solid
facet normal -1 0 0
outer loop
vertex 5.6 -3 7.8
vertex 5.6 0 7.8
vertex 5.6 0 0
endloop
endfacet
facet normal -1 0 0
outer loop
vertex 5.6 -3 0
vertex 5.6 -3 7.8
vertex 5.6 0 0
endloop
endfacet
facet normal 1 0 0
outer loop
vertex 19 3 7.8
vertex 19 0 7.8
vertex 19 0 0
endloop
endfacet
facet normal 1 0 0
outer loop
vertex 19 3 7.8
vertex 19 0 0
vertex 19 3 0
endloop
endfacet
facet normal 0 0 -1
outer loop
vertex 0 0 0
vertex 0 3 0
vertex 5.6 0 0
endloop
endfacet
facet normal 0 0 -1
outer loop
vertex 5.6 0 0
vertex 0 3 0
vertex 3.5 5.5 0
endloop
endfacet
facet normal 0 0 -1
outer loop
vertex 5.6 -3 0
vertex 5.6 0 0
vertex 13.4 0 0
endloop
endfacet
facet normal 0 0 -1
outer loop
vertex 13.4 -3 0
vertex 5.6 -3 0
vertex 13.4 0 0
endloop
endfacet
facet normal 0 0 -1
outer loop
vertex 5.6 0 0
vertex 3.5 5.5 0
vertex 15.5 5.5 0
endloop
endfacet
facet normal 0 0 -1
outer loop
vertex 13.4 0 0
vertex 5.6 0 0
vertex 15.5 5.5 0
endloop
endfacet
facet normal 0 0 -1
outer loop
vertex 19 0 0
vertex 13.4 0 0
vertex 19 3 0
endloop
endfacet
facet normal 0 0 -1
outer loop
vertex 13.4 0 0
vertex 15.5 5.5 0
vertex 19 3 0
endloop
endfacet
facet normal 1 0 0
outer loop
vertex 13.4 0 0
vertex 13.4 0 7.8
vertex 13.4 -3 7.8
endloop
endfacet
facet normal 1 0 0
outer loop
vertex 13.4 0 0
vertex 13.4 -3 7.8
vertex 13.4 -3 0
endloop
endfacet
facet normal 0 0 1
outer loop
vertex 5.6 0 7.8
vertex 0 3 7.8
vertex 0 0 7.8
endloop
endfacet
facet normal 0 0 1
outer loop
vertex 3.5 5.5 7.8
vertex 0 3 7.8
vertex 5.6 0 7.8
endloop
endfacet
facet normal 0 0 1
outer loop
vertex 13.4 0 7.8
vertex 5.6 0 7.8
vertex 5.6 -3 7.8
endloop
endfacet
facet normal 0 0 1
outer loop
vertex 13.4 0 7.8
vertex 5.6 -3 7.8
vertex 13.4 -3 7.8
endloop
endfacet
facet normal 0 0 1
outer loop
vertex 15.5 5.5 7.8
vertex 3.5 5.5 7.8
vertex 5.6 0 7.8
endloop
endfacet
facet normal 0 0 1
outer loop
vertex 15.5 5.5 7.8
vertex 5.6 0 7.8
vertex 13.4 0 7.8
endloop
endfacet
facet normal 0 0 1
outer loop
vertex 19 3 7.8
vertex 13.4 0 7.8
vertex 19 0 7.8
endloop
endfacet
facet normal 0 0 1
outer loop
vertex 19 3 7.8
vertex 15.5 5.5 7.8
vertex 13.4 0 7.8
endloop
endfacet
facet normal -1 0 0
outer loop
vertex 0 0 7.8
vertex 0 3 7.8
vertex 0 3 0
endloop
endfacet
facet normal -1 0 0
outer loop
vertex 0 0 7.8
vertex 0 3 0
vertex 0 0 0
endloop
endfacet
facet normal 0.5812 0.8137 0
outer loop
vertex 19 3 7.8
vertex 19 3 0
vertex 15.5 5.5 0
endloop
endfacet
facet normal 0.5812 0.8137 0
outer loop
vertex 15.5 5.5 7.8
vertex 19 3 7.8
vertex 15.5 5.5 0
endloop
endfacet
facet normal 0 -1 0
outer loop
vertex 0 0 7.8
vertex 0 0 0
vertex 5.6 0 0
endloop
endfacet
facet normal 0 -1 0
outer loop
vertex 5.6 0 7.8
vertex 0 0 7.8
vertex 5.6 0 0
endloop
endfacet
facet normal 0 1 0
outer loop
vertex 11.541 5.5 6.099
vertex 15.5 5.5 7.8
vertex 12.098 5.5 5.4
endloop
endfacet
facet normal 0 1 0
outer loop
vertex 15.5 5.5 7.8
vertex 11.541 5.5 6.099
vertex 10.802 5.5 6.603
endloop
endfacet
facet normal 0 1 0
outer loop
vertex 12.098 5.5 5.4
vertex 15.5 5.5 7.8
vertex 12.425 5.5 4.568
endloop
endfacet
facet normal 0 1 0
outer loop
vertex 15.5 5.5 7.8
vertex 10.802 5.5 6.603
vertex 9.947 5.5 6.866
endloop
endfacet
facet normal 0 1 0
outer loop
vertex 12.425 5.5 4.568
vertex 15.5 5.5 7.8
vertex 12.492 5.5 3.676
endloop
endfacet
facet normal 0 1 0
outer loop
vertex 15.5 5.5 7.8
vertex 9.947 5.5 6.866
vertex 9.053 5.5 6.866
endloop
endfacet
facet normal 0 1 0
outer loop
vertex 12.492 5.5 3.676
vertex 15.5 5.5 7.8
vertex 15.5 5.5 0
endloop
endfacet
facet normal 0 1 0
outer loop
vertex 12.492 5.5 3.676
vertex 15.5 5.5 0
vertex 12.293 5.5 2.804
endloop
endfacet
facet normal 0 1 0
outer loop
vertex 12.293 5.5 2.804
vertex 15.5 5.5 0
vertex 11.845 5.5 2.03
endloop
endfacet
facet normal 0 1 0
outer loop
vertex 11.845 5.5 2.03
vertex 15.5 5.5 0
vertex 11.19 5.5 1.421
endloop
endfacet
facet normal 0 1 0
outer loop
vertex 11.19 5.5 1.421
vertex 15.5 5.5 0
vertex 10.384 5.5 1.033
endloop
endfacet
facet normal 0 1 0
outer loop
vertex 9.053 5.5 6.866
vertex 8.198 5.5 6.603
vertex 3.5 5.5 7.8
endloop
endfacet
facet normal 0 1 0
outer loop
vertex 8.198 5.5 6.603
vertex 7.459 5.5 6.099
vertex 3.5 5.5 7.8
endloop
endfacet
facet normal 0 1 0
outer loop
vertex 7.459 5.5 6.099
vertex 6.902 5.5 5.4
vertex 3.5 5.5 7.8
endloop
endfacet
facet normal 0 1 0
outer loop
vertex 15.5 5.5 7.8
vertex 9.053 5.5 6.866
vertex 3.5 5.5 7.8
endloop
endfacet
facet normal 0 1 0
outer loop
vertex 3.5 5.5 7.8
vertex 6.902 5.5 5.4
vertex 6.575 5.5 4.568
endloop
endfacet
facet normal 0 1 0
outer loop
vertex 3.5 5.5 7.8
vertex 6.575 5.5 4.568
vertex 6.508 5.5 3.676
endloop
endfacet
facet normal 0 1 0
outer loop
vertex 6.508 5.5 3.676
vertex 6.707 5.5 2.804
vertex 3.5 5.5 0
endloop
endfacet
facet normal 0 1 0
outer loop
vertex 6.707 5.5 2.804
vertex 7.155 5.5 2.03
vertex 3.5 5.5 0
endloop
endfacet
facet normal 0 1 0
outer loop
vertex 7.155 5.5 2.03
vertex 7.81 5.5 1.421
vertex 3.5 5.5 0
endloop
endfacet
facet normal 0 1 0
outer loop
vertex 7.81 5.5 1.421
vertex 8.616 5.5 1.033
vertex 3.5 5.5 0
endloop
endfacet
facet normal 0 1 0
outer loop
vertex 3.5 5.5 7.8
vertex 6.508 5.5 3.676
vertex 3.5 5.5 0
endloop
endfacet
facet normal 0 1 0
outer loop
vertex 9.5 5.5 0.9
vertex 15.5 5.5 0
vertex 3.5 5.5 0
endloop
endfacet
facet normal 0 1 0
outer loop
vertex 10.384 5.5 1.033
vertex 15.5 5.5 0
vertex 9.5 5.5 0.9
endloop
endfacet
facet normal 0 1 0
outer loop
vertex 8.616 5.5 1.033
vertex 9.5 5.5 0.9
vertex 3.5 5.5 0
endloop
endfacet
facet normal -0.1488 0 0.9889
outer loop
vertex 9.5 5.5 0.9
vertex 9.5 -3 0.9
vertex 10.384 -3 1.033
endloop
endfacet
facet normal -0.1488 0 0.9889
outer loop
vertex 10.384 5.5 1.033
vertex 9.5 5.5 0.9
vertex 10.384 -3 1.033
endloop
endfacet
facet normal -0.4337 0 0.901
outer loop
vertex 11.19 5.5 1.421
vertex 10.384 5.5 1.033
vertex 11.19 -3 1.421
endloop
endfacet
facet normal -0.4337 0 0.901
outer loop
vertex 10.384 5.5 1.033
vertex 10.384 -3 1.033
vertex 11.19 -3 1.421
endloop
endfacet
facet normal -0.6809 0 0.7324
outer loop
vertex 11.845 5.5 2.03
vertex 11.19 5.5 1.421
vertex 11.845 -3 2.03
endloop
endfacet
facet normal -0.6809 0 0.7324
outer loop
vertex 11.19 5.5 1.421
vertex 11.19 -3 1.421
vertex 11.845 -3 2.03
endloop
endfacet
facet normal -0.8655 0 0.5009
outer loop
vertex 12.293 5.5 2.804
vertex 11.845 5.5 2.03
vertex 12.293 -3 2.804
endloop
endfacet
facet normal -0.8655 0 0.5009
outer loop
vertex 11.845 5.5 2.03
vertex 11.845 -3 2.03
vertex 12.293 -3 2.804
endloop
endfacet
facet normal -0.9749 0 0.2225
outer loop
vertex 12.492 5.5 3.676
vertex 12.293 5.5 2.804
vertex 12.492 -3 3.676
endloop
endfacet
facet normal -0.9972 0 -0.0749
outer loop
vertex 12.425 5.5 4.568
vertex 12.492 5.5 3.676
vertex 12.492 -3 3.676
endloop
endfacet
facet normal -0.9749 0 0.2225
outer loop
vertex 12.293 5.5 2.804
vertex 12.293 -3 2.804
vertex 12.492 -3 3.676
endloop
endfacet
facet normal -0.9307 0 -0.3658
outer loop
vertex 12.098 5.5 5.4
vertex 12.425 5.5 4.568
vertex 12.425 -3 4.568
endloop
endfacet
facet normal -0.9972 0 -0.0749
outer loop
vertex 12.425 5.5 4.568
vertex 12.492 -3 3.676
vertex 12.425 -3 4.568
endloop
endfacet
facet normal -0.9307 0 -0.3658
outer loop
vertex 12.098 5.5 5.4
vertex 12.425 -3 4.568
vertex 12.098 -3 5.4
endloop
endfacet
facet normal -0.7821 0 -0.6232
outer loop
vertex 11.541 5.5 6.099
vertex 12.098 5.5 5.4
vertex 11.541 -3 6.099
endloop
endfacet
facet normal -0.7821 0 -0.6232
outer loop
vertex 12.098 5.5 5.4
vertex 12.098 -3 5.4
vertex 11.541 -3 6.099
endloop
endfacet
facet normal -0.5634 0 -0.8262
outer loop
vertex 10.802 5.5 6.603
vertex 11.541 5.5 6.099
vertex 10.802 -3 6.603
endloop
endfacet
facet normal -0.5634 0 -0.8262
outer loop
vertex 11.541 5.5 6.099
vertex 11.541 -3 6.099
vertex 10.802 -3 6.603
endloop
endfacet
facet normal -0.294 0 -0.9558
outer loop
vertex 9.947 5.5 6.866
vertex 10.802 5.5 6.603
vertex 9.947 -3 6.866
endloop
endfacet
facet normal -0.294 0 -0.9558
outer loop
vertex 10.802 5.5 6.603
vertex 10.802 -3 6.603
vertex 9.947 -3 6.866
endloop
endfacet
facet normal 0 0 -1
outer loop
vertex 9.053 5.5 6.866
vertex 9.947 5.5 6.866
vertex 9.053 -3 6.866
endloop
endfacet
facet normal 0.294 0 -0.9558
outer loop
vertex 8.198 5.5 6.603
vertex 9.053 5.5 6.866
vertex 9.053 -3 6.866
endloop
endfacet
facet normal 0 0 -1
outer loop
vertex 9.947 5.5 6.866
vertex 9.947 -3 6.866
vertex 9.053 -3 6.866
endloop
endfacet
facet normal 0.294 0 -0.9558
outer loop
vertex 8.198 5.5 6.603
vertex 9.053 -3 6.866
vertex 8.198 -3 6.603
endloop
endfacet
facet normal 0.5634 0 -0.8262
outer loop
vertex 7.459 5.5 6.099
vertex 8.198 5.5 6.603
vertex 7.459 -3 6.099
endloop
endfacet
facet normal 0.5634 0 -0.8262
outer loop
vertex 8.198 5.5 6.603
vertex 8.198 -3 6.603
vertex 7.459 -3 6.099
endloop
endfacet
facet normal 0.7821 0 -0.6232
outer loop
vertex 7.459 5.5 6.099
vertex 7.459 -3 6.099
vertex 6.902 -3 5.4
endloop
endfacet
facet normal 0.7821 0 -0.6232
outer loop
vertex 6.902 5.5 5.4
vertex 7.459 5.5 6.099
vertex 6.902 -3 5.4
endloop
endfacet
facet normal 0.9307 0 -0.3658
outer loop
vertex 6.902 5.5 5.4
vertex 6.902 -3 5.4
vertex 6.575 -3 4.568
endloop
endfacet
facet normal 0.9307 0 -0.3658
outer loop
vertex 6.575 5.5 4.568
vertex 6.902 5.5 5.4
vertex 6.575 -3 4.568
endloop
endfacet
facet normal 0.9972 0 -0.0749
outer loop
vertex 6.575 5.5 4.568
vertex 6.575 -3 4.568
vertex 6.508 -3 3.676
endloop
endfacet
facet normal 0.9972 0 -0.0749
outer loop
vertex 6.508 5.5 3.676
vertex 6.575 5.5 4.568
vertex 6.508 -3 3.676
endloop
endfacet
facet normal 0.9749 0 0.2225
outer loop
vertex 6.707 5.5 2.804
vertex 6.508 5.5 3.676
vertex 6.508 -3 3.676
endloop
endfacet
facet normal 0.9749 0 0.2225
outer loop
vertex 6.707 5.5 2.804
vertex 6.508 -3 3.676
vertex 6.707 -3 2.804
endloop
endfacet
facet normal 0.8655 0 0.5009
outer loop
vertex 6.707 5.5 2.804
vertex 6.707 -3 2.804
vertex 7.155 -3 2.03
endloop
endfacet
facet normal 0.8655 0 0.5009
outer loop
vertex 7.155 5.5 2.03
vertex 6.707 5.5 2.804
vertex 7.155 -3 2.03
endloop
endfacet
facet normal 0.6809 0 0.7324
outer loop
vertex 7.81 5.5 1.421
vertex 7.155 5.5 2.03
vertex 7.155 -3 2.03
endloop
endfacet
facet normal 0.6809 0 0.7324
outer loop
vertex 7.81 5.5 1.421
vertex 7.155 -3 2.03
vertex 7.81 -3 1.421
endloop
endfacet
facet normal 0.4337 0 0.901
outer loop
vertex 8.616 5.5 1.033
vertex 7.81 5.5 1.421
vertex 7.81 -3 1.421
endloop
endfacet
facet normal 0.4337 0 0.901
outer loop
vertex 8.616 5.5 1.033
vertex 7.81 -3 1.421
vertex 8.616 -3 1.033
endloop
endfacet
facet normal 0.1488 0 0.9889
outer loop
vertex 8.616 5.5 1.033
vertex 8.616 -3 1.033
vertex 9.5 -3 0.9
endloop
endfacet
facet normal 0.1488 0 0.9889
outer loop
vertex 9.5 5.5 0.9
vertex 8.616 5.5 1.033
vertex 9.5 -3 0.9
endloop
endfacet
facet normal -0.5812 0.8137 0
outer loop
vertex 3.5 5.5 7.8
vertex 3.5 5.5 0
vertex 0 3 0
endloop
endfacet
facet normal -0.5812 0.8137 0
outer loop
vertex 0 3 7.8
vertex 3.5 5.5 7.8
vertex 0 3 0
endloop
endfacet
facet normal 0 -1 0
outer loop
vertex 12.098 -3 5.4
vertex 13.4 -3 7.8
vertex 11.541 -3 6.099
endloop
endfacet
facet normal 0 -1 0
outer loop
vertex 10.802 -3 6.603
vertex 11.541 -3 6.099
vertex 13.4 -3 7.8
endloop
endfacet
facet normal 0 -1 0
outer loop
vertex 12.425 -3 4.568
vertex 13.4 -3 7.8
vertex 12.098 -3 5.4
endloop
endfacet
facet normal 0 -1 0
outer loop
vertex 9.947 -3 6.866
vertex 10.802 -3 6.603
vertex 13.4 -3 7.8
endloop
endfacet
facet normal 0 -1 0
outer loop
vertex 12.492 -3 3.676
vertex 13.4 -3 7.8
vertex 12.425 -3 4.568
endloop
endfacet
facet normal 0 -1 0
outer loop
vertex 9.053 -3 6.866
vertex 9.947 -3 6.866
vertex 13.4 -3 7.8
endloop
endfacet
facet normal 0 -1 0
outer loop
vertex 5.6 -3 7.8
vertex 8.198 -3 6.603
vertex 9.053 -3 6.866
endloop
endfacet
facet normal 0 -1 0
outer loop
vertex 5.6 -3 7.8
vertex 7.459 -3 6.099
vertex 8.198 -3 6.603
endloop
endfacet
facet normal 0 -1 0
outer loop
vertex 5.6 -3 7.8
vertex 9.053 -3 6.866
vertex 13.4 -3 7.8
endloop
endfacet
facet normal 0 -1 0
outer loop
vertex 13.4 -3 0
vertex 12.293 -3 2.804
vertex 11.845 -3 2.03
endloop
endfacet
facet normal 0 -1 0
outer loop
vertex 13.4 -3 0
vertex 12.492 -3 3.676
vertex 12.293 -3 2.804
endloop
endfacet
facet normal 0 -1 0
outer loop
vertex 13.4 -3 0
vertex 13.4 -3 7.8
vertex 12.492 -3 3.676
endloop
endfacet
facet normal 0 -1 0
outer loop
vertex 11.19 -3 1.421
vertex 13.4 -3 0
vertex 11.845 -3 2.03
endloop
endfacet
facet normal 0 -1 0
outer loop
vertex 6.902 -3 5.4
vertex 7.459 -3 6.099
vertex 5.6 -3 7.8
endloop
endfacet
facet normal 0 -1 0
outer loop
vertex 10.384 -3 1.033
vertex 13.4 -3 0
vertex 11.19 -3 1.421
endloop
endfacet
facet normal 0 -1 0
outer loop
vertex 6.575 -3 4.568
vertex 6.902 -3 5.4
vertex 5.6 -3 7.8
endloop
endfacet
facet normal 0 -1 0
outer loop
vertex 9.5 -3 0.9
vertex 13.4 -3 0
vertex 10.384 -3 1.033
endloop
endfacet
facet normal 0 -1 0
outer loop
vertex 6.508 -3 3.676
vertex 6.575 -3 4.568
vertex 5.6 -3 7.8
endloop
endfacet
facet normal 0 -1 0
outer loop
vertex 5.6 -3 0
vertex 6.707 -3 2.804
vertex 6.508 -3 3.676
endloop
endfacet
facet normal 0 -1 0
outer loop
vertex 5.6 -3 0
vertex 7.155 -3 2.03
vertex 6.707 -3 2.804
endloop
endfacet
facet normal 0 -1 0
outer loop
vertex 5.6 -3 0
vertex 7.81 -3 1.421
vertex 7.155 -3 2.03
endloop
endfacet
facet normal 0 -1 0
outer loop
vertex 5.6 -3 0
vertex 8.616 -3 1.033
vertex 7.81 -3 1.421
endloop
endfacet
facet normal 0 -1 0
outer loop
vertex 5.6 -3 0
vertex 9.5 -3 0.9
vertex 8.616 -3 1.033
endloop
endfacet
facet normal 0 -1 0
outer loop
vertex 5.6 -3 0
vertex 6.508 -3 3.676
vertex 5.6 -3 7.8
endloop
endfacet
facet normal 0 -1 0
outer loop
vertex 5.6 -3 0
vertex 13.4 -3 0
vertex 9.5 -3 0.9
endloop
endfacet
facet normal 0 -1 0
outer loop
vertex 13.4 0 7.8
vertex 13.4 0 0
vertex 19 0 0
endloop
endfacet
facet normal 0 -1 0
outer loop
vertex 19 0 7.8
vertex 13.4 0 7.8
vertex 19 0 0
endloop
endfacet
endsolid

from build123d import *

# Parameters (mm, degrees)
EXTRUDE_2_DEPTH     = 7.8
SKETCH_3_W          = 7.8
SKETCH_3_H          = 7.8
EXTRUDE_3_DEPTH     = 3
CUT_EXTRUDE_1_REACH = 24.228
SKETCH_4_R          = 3


with BuildPart() as part:
    # 草图2 → 凸台-拉伸2 (new body)
    with BuildSketch(Plane.XY):
        Polygon((0, 0), (19, 0), (19, 3), (15.5, 5.5), (3.5, 5.5), (0, 3), align=None)
    extrude(amount=EXTRUDE_2_DEPTH)

    # 草图3 → 凸台-拉伸3 (add)
    with BuildSketch(Plane(origin=(0, 0, 0), x_dir=(-1, 0, 0), z_dir=(0, -1, 0))):
        with Locations((-9.5, -3.9)):
            Rectangle(SKETCH_3_W, SKETCH_3_H)
    extrude(amount=EXTRUDE_3_DEPTH)

    # 草图4 → 切除-拉伸1 (cut, up to next)
    with BuildSketch(Plane(origin=(0, -3, 0), x_dir=(-1, 0, 0), z_dir=(0, -1, 0)), mode=Mode.PRIVATE) as cut_extrude_1_sk1:
        with Locations(Location((-9.5, -3.9, 0), (0, 0, 90))):
            Circle(SKETCH_4_R)
    cut_extrude_1_tool1 = extrude(cut_extrude_1_sk1.sketch, amount=-CUT_EXTRUDE_1_REACH, mode=Mode.PRIVATE) & part.part
    add(cut_extrude_1_tool1.solids().sort_by_distance((9.5, -3, 3.9))[0], mode=Mode.SUBTRACT)


solid = part.part
